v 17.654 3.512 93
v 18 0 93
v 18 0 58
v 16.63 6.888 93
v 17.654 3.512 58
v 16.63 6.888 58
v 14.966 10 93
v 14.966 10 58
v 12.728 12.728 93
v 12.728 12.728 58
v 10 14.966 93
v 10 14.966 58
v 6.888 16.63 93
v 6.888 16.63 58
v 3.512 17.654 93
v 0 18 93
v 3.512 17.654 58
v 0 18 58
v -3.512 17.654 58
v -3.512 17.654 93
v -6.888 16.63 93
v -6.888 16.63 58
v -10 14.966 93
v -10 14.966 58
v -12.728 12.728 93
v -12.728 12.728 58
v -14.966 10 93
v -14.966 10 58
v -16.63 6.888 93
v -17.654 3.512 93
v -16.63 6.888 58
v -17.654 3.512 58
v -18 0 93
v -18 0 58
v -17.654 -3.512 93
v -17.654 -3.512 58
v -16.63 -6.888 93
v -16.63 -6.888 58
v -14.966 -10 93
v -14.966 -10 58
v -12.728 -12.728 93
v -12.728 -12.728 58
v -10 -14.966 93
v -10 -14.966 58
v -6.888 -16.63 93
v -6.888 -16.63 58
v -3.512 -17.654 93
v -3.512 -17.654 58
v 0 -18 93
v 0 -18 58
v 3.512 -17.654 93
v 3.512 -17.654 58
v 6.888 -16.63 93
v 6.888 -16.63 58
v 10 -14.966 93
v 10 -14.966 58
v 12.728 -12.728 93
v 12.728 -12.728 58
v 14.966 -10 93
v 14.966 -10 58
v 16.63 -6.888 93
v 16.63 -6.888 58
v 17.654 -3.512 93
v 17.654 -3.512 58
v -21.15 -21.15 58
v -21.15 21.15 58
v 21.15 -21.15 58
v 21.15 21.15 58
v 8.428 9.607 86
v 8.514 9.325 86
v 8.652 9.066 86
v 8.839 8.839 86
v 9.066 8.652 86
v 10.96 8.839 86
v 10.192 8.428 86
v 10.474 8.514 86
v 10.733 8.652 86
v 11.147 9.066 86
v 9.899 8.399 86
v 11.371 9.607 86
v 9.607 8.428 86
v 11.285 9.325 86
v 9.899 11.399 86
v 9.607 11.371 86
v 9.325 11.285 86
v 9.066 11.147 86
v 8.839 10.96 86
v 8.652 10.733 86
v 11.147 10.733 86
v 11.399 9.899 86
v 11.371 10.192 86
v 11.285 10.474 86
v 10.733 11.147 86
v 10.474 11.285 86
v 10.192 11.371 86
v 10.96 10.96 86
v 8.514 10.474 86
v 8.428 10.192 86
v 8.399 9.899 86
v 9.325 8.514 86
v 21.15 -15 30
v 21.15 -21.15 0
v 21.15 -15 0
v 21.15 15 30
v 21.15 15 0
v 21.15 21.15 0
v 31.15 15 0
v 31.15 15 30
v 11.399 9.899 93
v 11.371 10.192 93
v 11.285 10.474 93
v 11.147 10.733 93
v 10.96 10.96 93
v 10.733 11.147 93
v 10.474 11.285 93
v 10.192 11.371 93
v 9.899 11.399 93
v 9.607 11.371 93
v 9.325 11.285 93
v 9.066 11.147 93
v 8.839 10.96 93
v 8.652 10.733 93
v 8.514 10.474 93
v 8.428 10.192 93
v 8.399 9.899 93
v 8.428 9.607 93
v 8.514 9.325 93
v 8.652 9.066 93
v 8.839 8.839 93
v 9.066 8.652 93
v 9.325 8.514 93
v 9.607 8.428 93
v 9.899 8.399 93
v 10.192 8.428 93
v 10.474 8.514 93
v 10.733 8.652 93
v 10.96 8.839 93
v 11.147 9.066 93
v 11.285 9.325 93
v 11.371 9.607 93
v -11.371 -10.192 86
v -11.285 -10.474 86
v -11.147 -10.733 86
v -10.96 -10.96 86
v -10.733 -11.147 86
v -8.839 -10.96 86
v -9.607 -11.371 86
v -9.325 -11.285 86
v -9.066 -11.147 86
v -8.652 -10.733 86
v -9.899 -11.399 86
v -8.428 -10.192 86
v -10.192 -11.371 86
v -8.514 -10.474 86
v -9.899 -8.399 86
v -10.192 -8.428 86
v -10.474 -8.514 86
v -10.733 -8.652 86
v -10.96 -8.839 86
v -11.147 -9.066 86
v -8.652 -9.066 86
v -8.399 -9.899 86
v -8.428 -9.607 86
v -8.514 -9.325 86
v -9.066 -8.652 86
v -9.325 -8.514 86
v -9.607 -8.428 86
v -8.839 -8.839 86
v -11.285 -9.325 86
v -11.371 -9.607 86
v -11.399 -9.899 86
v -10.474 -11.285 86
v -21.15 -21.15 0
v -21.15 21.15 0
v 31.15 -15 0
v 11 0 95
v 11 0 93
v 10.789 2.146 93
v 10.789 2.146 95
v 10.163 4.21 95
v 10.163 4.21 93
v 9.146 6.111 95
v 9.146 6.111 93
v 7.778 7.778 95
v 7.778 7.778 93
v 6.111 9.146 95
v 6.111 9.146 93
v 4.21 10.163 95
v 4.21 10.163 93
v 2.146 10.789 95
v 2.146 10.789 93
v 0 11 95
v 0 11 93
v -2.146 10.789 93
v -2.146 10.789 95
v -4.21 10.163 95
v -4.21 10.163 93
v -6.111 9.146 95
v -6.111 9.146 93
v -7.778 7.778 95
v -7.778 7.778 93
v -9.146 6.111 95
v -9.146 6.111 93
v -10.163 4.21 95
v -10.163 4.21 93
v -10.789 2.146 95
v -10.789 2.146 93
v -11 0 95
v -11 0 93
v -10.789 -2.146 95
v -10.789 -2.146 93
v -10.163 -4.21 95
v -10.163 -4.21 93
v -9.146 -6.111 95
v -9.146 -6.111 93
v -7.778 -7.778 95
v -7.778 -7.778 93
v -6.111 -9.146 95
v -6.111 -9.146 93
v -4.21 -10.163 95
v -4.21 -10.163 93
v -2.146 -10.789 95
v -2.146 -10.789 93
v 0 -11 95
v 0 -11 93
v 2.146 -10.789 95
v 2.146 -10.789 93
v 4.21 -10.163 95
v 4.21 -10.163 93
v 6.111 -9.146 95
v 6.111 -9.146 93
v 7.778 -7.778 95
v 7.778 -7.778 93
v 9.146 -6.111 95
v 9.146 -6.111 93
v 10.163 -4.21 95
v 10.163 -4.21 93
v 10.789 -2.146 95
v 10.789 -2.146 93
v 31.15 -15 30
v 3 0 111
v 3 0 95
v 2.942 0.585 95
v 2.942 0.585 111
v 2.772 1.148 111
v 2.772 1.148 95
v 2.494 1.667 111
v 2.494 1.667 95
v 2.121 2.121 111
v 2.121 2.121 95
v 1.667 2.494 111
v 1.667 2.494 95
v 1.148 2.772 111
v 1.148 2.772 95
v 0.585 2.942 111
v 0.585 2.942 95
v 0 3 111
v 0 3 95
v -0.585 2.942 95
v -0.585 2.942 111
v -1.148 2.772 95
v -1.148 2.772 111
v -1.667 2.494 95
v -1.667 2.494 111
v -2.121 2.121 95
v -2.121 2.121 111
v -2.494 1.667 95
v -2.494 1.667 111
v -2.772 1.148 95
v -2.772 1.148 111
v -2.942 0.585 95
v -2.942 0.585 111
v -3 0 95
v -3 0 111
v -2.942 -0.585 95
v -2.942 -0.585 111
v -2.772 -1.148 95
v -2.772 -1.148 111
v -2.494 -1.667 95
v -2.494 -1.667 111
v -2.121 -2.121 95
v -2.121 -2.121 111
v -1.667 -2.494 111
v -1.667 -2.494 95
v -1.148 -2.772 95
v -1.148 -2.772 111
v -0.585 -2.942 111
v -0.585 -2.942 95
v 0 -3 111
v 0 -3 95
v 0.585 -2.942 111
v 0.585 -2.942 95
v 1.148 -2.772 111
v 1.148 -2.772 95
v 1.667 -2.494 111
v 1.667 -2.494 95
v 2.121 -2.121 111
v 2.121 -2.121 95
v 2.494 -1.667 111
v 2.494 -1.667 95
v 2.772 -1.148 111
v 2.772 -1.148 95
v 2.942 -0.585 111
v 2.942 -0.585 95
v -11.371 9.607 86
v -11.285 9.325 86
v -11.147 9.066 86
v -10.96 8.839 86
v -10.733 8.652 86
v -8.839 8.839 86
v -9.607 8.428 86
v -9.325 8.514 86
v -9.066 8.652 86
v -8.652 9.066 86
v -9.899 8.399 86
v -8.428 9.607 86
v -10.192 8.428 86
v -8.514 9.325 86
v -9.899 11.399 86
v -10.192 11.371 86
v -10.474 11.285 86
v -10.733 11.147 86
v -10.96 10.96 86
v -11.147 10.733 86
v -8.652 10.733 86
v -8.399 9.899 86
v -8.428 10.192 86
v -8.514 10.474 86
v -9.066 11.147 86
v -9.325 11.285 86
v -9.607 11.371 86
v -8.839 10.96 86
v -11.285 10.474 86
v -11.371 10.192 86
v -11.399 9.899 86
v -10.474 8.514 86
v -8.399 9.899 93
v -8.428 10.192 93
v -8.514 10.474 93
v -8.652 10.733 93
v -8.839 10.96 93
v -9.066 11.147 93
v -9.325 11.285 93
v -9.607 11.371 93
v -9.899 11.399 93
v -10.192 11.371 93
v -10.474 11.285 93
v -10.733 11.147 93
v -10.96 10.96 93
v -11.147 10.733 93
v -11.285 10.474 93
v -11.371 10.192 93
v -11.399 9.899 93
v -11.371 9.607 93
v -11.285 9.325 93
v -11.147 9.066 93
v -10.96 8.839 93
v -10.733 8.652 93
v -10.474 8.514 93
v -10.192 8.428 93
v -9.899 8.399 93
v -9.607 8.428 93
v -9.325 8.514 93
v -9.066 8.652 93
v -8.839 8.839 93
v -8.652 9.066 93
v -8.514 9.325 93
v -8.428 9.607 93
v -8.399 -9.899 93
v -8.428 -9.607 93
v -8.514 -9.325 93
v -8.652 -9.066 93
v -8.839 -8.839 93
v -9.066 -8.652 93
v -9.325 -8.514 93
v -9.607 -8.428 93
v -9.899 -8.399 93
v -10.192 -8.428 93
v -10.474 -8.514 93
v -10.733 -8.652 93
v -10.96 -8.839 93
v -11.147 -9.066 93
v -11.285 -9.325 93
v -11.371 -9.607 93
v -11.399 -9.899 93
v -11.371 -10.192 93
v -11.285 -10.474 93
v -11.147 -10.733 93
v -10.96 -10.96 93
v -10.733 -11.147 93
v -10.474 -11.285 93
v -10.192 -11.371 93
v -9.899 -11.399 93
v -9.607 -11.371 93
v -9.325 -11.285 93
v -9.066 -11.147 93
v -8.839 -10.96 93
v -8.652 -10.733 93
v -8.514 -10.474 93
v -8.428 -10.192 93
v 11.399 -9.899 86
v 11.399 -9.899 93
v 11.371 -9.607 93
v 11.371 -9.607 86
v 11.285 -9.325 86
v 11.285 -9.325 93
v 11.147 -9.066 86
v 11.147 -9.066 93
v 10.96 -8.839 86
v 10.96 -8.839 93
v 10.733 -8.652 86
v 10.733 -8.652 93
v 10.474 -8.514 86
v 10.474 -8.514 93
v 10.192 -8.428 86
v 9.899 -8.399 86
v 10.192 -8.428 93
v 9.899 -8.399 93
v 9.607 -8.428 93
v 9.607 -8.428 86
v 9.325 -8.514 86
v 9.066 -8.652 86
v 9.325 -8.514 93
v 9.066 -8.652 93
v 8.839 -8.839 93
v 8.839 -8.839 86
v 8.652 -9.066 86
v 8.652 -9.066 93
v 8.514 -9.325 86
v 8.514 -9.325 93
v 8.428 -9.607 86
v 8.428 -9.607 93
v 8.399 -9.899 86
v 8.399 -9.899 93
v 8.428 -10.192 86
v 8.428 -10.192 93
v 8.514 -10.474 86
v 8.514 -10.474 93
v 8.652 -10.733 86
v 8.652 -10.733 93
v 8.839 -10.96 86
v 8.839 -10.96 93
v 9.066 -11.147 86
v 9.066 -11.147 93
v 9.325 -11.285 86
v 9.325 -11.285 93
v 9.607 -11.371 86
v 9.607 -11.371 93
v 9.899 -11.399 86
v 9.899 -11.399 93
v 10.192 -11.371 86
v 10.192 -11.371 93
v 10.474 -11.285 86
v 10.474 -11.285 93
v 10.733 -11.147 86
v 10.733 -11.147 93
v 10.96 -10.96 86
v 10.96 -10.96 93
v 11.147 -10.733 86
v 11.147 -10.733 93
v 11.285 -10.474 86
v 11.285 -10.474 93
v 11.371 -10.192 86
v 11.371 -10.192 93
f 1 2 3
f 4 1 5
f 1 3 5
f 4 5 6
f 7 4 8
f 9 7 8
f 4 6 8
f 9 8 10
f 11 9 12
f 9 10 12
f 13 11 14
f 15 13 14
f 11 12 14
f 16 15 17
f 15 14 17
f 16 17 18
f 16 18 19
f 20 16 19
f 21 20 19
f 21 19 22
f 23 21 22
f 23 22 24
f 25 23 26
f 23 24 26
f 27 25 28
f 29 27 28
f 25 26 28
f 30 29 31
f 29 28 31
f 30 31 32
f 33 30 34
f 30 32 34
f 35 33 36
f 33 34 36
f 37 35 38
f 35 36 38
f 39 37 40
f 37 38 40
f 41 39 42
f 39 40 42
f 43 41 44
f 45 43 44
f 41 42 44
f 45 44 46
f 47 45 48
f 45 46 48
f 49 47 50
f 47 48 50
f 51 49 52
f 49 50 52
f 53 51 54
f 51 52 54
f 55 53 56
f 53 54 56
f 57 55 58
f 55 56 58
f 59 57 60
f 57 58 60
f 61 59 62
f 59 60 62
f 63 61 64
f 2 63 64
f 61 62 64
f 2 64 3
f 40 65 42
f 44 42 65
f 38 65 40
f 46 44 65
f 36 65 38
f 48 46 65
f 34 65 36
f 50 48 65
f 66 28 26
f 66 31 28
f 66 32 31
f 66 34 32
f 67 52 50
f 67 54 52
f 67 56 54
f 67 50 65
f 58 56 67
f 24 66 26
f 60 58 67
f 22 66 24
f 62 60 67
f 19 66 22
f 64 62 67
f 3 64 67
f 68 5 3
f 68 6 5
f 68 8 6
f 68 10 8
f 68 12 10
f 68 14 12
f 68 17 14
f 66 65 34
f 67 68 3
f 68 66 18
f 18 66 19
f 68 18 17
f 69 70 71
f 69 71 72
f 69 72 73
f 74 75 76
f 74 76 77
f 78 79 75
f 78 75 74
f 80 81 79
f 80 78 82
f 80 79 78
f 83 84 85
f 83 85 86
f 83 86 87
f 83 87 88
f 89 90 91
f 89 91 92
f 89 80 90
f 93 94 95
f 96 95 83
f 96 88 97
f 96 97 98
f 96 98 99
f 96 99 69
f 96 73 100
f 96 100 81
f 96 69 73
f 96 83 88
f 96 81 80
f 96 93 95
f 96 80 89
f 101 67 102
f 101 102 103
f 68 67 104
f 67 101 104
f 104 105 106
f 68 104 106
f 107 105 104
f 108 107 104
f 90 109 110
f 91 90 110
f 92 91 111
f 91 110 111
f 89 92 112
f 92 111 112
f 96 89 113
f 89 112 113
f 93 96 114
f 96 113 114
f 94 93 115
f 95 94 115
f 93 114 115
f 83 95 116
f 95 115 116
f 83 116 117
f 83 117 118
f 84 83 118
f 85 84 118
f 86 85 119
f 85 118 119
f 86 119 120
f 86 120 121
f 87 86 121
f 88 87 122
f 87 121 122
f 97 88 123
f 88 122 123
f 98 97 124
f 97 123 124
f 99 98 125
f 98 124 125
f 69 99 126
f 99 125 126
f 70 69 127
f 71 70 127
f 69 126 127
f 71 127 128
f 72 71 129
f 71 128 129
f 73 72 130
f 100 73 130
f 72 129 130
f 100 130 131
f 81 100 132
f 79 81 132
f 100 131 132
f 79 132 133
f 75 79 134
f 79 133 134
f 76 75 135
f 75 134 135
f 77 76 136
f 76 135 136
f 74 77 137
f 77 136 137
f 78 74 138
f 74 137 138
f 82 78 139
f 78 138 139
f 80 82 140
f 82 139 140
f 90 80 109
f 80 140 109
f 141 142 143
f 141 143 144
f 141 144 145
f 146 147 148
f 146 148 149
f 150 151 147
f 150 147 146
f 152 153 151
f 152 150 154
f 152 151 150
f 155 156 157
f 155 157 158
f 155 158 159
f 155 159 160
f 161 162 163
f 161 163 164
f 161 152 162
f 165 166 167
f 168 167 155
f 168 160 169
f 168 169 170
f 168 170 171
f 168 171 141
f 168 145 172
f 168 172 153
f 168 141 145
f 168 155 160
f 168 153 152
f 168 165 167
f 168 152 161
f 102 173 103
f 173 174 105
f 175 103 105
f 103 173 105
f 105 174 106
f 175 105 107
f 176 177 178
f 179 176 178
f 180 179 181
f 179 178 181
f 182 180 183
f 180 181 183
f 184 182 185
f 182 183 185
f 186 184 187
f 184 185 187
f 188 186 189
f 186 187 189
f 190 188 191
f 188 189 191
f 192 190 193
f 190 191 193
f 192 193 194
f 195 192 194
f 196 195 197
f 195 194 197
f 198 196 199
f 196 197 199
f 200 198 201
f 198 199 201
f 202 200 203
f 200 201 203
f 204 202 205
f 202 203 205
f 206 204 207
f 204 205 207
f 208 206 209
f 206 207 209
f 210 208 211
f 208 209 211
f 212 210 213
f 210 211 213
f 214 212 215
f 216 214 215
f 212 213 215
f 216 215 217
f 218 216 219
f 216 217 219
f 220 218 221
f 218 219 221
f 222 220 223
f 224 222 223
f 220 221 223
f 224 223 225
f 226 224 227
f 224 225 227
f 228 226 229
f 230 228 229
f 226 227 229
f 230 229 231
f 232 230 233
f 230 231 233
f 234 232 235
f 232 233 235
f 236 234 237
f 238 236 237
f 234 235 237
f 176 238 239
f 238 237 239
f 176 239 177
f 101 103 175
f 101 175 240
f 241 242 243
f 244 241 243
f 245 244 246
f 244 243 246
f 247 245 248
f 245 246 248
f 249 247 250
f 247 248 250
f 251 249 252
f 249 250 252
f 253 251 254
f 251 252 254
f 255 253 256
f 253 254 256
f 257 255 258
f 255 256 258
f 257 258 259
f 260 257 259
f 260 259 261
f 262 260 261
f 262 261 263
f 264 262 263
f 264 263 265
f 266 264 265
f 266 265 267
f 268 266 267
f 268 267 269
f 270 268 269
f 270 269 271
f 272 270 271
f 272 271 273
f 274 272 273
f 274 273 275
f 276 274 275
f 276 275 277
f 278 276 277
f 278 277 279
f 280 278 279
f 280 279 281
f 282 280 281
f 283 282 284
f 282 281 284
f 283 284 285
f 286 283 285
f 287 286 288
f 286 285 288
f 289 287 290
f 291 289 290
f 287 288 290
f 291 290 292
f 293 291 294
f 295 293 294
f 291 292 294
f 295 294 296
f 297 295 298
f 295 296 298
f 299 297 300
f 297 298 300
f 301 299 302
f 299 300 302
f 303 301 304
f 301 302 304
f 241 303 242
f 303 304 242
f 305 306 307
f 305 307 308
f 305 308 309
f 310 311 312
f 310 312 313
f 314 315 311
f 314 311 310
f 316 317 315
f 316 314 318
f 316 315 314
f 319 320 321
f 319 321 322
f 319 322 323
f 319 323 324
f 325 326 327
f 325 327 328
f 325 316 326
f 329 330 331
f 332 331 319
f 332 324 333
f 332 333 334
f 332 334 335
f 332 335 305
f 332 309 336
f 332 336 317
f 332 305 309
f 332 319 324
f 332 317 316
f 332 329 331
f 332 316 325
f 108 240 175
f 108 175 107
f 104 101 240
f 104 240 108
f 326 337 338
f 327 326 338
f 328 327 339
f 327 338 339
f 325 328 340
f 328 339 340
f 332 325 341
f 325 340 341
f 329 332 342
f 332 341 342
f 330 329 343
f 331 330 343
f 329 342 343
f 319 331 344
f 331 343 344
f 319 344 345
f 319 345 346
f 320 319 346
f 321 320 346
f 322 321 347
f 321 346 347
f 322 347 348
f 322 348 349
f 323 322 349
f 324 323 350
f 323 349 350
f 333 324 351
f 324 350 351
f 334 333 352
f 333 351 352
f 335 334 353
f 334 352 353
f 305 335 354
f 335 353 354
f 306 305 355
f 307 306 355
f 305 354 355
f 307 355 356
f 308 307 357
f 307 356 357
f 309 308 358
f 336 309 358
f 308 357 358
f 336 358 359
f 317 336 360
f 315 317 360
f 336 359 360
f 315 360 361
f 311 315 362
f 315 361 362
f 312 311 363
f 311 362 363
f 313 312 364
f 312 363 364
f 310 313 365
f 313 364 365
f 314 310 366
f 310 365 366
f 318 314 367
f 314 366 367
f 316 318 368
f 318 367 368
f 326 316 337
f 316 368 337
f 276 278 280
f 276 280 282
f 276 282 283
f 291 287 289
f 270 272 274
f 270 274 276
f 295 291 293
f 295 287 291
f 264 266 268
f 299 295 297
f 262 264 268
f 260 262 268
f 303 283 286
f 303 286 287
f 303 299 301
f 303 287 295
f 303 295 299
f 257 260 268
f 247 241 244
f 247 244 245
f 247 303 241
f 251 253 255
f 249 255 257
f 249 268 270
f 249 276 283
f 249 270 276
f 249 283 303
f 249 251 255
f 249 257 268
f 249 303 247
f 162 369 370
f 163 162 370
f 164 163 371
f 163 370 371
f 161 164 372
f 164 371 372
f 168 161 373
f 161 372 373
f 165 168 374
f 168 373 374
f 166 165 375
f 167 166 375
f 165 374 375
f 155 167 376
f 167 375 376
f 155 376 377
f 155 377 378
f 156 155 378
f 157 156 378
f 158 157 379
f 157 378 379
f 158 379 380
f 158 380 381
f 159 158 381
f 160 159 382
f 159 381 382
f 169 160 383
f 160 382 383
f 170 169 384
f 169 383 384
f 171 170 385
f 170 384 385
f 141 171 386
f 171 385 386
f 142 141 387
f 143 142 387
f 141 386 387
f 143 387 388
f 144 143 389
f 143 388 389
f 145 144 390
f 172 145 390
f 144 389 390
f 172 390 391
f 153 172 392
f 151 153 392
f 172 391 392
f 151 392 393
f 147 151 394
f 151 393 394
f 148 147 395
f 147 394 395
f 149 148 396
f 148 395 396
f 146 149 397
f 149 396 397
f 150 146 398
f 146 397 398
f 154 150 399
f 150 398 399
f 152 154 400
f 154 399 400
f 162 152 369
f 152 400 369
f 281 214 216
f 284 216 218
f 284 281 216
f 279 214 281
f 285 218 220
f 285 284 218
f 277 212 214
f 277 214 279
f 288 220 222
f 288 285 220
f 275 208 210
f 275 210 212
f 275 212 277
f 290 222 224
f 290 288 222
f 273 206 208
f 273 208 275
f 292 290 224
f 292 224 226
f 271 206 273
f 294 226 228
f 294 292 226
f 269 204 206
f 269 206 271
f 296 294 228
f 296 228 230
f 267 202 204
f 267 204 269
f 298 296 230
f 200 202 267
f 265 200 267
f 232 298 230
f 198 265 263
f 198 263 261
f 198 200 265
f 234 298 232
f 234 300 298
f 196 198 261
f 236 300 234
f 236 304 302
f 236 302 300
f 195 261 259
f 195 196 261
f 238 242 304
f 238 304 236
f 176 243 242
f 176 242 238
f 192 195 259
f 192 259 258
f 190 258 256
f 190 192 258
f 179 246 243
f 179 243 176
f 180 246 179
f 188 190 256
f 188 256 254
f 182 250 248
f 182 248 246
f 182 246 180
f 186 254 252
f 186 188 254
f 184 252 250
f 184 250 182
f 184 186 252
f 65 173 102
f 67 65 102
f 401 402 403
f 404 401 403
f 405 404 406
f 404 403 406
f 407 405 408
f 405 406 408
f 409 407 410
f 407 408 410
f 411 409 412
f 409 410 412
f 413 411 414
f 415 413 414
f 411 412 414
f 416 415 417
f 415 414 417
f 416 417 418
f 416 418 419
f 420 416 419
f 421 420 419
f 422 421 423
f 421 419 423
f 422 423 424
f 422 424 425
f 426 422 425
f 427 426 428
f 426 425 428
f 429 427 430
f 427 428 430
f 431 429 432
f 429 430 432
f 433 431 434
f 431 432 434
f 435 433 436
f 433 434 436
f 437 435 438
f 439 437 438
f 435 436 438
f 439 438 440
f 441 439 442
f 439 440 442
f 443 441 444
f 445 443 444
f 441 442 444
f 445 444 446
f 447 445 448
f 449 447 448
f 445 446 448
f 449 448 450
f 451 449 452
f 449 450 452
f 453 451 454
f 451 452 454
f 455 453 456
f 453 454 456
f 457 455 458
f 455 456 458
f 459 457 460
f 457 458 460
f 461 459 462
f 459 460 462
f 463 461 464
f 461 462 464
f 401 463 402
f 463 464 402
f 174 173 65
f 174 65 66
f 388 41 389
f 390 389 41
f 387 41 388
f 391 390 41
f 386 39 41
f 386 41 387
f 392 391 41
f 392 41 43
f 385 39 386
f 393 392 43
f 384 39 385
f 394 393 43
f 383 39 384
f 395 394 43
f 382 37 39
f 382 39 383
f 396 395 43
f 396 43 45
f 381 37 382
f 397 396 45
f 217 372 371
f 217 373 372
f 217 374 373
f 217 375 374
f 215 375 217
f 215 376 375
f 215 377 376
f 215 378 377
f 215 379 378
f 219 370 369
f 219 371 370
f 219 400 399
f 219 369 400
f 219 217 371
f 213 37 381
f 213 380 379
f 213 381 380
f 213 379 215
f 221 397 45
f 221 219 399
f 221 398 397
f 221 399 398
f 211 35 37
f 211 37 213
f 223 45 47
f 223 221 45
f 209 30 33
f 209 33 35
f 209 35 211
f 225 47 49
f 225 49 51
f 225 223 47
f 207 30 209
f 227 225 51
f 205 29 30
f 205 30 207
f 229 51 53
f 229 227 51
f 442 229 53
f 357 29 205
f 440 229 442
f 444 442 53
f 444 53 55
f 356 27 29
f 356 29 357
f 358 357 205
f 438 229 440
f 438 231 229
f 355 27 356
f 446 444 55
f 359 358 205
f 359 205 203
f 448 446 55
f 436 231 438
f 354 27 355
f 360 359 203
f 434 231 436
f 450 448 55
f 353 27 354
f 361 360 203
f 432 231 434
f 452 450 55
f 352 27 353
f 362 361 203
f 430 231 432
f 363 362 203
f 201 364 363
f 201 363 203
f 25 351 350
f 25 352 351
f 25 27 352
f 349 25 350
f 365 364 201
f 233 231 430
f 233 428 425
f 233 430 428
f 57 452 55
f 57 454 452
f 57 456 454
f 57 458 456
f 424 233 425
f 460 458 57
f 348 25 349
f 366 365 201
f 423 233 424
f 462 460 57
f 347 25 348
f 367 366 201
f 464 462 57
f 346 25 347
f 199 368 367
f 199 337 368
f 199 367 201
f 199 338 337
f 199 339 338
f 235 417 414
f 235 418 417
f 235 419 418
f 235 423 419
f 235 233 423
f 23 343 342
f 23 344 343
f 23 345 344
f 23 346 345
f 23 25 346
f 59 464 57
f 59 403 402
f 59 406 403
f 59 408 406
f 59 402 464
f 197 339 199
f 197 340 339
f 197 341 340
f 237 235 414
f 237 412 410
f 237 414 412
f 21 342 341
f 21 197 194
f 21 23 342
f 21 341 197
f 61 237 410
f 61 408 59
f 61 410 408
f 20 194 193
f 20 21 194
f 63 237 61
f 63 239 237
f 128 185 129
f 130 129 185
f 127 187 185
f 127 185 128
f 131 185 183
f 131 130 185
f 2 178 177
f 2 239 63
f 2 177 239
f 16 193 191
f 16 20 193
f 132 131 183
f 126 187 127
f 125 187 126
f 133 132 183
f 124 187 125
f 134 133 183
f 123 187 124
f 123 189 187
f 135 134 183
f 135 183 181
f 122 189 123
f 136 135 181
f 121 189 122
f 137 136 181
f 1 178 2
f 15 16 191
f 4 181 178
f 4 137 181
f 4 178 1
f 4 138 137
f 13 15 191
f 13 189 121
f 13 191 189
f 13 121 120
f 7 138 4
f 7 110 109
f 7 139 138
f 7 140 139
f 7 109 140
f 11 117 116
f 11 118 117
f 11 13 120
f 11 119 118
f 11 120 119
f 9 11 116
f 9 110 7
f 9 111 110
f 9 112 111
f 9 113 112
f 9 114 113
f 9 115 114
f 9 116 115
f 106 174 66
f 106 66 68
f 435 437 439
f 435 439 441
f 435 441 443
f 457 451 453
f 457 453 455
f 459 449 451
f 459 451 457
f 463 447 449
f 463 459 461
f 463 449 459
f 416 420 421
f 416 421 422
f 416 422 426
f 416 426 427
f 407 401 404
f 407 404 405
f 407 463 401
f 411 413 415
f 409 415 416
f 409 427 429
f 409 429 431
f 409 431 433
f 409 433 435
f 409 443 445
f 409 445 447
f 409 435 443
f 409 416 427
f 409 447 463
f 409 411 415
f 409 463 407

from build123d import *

# Parameters (mm, degrees)
SKETCH013_W     = 42.3
SKETCH013_H     = 42.3
PAD008_DEPTH    = 58
SKETCH012_R     = 18
PAD011_DEPTH    = 35
SKETCH011_R     = 3
PAD010_DEPTH    = 18
SKETCH010_R     = 11
PAD004_DEPTH    = 2
SKETCH009_R     = 1.5
POCKET001_DEPTH = 7
SKETCH006_W     = 30
SKETCH006_H     = 30
PAD009_DEPTH    = 10


with BuildPart() as part:
    # Sketch013 → Pad008 (new body)
    with BuildSketch(Plane.XY):
        Rectangle(SKETCH013_W, SKETCH013_H)
    extrude(amount=PAD008_DEPTH)

    # Sketch012 (on Face6 of Pad008) → Pad011 (join)
    with BuildSketch(Plane.XY.offset(58)):
        Circle(SKETCH012_R)
    extrude(amount=PAD011_DEPTH)

    # Sketch011 (on Face8 of Pad011) → Pad010 (join)
    with BuildSketch(Plane.XY.offset(93)):
        Circle(SKETCH011_R)
    extrude(amount=PAD010_DEPTH)

    # Sketch010 (on Face8 of Pad010) → Pad004 (join)
    with BuildSketch(Plane.XY.offset(93)):
        Circle(SKETCH010_R)
    extrude(amount=PAD004_DEPTH)

    # Sketch009 (on Face8 of Pad004) → Pocket001 (cut)
    with BuildSketch(Plane.XY.offset(93)):
        with Locations((-9.899495, 9.899495)):
            Circle(SKETCH009_R)
        with Locations((9.899495, 9.899495)):
            Circle(SKETCH009_R)
        with Locations((9.899495, -9.899495)):
            Circle(SKETCH009_R)
        with Locations((-9.899495, -9.899495)):
            Circle(SKETCH009_R)
    extrude(amount=-POCKET001_DEPTH, mode=Mode.SUBTRACT)

    # Sketch006 (on Face3 of Pocket001) → Pad009 (join)
    with BuildSketch(Plane.YZ.offset(21.15)):
        with Locations((0, 15)):
            Rectangle(SKETCH006_W, SKETCH006_H)
    extrude(amount=PAD009_DEPTH)


solid = part.part
